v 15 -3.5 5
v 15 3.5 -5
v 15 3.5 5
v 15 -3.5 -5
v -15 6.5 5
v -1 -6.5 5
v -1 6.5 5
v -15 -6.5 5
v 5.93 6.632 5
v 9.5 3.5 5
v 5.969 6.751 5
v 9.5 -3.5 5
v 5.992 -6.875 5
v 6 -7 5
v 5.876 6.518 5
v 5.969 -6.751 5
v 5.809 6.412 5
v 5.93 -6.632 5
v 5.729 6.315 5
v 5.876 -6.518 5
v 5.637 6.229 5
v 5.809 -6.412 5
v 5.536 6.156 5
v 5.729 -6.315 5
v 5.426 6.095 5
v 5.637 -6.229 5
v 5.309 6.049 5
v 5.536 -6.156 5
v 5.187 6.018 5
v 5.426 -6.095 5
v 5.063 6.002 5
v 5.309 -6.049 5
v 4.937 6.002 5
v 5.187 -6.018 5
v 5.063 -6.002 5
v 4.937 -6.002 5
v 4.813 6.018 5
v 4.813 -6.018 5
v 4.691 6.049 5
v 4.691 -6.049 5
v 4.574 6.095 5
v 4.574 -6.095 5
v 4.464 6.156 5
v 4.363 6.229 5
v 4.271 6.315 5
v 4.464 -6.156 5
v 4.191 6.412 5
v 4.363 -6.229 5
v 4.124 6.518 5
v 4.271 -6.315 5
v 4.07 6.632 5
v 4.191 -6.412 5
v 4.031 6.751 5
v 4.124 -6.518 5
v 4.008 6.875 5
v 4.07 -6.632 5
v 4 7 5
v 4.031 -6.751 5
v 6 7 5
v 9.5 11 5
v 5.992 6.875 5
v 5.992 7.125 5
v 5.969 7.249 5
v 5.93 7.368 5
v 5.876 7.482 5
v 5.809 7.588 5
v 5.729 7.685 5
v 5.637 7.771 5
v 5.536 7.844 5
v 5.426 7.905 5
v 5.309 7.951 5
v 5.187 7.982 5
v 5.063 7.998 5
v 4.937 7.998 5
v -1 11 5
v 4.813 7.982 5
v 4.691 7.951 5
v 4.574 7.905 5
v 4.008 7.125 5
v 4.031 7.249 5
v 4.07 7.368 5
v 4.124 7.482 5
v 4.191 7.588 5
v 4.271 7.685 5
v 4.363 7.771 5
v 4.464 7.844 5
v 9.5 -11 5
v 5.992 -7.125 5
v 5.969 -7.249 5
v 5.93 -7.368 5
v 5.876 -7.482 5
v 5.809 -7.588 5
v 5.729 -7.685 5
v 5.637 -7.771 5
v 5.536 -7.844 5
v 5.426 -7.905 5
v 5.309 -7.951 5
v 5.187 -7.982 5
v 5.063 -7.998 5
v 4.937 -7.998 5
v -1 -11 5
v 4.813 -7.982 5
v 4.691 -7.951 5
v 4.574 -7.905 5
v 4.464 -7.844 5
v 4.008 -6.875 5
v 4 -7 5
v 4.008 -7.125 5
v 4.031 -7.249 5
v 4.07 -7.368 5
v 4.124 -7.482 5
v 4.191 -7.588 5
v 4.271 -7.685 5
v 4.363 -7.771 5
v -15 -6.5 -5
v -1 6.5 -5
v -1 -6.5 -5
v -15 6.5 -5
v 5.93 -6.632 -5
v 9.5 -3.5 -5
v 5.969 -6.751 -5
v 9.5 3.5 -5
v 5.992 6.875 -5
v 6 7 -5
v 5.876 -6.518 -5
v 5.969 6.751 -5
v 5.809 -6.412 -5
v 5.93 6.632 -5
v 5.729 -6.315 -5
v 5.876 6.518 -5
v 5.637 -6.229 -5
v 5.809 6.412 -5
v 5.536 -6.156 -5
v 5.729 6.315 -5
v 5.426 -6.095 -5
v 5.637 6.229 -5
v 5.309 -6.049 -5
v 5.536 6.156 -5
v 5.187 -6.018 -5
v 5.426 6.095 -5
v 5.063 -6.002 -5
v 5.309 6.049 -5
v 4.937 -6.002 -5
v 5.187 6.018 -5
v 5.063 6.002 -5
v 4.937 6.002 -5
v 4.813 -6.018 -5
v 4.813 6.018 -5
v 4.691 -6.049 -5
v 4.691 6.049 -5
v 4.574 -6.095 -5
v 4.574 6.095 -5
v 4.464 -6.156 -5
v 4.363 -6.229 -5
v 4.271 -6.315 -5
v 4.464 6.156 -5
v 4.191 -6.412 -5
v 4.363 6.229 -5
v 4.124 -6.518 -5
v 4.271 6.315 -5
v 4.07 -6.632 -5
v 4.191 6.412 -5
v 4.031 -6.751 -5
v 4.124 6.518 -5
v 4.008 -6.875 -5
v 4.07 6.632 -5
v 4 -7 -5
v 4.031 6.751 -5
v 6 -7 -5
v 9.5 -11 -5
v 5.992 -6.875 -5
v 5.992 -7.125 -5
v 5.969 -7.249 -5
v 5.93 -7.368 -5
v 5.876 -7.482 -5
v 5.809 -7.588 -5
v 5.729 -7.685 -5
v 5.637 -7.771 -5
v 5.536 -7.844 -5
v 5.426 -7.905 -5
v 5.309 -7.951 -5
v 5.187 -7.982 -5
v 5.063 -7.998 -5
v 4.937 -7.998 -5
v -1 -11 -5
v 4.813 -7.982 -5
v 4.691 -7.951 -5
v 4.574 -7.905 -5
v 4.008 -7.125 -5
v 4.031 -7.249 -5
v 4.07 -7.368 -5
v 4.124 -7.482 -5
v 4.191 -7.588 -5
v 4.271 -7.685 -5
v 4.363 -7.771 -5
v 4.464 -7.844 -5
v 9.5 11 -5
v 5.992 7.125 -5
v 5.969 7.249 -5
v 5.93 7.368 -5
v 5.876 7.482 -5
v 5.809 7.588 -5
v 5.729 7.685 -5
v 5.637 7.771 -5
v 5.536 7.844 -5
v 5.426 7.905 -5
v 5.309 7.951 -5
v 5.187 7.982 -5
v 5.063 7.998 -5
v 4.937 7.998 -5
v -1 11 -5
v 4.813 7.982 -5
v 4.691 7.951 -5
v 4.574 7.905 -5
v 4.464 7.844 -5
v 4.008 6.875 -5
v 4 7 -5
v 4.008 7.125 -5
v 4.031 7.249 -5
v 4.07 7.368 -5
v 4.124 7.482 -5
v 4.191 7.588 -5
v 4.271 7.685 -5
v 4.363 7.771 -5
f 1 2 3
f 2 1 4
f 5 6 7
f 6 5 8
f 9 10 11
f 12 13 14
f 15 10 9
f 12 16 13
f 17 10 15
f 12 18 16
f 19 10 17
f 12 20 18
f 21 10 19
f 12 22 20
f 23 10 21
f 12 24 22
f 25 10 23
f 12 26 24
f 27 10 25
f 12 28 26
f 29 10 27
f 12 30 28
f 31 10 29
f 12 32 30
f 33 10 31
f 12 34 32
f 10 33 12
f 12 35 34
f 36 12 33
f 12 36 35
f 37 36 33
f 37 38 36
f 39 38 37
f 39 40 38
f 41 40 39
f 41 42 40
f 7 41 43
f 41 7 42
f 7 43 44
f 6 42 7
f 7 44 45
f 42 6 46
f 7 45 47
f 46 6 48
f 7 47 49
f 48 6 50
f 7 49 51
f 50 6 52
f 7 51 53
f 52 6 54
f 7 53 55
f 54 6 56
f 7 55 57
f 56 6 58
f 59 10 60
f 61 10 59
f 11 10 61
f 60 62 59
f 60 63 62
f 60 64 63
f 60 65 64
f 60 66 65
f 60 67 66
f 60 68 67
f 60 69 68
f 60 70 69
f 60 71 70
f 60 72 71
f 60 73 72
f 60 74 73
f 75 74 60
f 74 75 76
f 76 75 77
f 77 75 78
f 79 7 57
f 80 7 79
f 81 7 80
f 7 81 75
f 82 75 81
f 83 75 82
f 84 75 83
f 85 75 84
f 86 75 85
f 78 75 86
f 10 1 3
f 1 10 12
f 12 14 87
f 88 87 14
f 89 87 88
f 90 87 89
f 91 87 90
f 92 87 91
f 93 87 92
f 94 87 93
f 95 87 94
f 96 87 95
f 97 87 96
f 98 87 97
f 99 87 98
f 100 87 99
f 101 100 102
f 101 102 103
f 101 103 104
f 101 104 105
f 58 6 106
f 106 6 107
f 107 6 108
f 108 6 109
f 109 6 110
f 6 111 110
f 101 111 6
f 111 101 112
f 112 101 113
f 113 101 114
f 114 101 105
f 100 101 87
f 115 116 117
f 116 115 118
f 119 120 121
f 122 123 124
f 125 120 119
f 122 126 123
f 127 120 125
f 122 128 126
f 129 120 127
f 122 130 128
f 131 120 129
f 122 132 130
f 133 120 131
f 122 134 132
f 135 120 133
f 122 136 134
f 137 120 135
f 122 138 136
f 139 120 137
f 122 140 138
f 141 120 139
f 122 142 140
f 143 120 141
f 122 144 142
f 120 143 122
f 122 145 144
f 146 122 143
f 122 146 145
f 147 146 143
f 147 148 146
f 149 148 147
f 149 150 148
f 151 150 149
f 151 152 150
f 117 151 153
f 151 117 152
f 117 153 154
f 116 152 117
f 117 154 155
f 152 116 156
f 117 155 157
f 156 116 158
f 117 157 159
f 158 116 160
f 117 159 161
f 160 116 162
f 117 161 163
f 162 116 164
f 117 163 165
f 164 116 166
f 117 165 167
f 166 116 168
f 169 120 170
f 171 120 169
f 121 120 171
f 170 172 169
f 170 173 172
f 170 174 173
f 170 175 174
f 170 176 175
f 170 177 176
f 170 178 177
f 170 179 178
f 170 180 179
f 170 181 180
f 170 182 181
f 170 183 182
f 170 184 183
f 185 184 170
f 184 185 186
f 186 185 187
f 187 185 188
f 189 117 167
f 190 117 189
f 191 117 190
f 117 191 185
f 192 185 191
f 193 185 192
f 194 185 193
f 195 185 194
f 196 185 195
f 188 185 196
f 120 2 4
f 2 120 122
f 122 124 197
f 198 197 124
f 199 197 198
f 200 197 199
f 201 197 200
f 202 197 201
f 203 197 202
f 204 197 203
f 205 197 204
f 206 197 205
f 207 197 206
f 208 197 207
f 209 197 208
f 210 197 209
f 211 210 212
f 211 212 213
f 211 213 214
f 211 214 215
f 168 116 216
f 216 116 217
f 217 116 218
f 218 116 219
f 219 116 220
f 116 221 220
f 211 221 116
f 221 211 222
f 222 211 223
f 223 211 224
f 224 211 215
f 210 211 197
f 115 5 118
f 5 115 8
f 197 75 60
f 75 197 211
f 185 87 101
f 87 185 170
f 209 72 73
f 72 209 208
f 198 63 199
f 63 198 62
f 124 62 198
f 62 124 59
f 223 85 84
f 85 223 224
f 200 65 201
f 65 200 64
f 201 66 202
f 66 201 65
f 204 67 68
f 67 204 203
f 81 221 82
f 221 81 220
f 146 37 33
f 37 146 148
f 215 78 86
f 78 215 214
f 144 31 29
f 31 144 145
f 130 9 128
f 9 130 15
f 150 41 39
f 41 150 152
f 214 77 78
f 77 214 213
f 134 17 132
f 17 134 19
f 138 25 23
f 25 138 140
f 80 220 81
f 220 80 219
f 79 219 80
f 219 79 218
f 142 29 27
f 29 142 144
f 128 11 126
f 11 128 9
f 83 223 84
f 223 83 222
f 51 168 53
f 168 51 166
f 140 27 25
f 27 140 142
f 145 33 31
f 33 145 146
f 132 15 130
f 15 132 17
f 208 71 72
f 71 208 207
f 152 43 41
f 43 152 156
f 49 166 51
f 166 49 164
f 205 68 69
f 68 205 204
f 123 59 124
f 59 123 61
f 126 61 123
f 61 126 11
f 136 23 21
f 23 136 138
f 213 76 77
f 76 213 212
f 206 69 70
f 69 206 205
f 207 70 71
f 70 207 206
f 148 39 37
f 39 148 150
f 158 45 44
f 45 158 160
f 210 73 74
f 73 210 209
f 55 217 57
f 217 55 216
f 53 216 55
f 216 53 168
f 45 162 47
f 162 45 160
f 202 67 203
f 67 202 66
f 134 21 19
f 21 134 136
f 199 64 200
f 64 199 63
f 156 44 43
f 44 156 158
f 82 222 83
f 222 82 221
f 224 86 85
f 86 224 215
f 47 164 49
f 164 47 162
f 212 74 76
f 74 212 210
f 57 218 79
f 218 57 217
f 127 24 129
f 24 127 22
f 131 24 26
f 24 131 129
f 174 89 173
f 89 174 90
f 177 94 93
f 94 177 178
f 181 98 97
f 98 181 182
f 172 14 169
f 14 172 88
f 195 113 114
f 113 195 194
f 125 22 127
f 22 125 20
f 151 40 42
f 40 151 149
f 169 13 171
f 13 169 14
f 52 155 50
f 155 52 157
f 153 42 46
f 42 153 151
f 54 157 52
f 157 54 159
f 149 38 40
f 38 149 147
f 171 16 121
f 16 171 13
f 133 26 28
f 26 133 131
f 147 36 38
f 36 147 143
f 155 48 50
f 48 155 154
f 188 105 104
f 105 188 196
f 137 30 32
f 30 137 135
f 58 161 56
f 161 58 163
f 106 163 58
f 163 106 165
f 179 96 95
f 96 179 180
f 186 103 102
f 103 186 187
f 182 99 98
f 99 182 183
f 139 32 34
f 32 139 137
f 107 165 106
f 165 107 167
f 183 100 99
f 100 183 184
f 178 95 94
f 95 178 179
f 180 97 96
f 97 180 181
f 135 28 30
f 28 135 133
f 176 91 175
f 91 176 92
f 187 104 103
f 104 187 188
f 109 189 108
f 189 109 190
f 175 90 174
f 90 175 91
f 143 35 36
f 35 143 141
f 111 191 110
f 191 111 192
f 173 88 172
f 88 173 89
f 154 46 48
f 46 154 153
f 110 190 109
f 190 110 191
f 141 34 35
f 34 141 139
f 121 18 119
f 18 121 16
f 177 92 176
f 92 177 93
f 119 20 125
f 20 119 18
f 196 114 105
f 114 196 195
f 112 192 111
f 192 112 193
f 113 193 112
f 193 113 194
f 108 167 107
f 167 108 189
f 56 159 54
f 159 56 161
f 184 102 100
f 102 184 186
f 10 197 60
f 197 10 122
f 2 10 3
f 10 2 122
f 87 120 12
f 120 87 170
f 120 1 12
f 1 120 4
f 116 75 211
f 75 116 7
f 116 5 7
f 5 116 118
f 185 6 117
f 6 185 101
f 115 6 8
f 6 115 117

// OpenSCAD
$fn=50;

difference(){
    cube([30, 22, 10], center=true);
    translate([5, 7, 0]){
        cylinder(h = 12, r = 2/2,center=true);
    }
    translate([5, -7, 0]){
        cylinder(h = 12, r = 2/2,center=true);
    }

    translate([17, 11, 0]){
        cube([15, 15, 12], center=true);
    }
    translate([17, -11, 0]){
        cube([15, 15, 12], center=true);
    }

    translate([-10, 14, 0]){
        cube([18, 15, 12], center=true);
    }
    translate([-10, -14, 0]){
        cube([18, 15, 12], center=true);
    }
}
